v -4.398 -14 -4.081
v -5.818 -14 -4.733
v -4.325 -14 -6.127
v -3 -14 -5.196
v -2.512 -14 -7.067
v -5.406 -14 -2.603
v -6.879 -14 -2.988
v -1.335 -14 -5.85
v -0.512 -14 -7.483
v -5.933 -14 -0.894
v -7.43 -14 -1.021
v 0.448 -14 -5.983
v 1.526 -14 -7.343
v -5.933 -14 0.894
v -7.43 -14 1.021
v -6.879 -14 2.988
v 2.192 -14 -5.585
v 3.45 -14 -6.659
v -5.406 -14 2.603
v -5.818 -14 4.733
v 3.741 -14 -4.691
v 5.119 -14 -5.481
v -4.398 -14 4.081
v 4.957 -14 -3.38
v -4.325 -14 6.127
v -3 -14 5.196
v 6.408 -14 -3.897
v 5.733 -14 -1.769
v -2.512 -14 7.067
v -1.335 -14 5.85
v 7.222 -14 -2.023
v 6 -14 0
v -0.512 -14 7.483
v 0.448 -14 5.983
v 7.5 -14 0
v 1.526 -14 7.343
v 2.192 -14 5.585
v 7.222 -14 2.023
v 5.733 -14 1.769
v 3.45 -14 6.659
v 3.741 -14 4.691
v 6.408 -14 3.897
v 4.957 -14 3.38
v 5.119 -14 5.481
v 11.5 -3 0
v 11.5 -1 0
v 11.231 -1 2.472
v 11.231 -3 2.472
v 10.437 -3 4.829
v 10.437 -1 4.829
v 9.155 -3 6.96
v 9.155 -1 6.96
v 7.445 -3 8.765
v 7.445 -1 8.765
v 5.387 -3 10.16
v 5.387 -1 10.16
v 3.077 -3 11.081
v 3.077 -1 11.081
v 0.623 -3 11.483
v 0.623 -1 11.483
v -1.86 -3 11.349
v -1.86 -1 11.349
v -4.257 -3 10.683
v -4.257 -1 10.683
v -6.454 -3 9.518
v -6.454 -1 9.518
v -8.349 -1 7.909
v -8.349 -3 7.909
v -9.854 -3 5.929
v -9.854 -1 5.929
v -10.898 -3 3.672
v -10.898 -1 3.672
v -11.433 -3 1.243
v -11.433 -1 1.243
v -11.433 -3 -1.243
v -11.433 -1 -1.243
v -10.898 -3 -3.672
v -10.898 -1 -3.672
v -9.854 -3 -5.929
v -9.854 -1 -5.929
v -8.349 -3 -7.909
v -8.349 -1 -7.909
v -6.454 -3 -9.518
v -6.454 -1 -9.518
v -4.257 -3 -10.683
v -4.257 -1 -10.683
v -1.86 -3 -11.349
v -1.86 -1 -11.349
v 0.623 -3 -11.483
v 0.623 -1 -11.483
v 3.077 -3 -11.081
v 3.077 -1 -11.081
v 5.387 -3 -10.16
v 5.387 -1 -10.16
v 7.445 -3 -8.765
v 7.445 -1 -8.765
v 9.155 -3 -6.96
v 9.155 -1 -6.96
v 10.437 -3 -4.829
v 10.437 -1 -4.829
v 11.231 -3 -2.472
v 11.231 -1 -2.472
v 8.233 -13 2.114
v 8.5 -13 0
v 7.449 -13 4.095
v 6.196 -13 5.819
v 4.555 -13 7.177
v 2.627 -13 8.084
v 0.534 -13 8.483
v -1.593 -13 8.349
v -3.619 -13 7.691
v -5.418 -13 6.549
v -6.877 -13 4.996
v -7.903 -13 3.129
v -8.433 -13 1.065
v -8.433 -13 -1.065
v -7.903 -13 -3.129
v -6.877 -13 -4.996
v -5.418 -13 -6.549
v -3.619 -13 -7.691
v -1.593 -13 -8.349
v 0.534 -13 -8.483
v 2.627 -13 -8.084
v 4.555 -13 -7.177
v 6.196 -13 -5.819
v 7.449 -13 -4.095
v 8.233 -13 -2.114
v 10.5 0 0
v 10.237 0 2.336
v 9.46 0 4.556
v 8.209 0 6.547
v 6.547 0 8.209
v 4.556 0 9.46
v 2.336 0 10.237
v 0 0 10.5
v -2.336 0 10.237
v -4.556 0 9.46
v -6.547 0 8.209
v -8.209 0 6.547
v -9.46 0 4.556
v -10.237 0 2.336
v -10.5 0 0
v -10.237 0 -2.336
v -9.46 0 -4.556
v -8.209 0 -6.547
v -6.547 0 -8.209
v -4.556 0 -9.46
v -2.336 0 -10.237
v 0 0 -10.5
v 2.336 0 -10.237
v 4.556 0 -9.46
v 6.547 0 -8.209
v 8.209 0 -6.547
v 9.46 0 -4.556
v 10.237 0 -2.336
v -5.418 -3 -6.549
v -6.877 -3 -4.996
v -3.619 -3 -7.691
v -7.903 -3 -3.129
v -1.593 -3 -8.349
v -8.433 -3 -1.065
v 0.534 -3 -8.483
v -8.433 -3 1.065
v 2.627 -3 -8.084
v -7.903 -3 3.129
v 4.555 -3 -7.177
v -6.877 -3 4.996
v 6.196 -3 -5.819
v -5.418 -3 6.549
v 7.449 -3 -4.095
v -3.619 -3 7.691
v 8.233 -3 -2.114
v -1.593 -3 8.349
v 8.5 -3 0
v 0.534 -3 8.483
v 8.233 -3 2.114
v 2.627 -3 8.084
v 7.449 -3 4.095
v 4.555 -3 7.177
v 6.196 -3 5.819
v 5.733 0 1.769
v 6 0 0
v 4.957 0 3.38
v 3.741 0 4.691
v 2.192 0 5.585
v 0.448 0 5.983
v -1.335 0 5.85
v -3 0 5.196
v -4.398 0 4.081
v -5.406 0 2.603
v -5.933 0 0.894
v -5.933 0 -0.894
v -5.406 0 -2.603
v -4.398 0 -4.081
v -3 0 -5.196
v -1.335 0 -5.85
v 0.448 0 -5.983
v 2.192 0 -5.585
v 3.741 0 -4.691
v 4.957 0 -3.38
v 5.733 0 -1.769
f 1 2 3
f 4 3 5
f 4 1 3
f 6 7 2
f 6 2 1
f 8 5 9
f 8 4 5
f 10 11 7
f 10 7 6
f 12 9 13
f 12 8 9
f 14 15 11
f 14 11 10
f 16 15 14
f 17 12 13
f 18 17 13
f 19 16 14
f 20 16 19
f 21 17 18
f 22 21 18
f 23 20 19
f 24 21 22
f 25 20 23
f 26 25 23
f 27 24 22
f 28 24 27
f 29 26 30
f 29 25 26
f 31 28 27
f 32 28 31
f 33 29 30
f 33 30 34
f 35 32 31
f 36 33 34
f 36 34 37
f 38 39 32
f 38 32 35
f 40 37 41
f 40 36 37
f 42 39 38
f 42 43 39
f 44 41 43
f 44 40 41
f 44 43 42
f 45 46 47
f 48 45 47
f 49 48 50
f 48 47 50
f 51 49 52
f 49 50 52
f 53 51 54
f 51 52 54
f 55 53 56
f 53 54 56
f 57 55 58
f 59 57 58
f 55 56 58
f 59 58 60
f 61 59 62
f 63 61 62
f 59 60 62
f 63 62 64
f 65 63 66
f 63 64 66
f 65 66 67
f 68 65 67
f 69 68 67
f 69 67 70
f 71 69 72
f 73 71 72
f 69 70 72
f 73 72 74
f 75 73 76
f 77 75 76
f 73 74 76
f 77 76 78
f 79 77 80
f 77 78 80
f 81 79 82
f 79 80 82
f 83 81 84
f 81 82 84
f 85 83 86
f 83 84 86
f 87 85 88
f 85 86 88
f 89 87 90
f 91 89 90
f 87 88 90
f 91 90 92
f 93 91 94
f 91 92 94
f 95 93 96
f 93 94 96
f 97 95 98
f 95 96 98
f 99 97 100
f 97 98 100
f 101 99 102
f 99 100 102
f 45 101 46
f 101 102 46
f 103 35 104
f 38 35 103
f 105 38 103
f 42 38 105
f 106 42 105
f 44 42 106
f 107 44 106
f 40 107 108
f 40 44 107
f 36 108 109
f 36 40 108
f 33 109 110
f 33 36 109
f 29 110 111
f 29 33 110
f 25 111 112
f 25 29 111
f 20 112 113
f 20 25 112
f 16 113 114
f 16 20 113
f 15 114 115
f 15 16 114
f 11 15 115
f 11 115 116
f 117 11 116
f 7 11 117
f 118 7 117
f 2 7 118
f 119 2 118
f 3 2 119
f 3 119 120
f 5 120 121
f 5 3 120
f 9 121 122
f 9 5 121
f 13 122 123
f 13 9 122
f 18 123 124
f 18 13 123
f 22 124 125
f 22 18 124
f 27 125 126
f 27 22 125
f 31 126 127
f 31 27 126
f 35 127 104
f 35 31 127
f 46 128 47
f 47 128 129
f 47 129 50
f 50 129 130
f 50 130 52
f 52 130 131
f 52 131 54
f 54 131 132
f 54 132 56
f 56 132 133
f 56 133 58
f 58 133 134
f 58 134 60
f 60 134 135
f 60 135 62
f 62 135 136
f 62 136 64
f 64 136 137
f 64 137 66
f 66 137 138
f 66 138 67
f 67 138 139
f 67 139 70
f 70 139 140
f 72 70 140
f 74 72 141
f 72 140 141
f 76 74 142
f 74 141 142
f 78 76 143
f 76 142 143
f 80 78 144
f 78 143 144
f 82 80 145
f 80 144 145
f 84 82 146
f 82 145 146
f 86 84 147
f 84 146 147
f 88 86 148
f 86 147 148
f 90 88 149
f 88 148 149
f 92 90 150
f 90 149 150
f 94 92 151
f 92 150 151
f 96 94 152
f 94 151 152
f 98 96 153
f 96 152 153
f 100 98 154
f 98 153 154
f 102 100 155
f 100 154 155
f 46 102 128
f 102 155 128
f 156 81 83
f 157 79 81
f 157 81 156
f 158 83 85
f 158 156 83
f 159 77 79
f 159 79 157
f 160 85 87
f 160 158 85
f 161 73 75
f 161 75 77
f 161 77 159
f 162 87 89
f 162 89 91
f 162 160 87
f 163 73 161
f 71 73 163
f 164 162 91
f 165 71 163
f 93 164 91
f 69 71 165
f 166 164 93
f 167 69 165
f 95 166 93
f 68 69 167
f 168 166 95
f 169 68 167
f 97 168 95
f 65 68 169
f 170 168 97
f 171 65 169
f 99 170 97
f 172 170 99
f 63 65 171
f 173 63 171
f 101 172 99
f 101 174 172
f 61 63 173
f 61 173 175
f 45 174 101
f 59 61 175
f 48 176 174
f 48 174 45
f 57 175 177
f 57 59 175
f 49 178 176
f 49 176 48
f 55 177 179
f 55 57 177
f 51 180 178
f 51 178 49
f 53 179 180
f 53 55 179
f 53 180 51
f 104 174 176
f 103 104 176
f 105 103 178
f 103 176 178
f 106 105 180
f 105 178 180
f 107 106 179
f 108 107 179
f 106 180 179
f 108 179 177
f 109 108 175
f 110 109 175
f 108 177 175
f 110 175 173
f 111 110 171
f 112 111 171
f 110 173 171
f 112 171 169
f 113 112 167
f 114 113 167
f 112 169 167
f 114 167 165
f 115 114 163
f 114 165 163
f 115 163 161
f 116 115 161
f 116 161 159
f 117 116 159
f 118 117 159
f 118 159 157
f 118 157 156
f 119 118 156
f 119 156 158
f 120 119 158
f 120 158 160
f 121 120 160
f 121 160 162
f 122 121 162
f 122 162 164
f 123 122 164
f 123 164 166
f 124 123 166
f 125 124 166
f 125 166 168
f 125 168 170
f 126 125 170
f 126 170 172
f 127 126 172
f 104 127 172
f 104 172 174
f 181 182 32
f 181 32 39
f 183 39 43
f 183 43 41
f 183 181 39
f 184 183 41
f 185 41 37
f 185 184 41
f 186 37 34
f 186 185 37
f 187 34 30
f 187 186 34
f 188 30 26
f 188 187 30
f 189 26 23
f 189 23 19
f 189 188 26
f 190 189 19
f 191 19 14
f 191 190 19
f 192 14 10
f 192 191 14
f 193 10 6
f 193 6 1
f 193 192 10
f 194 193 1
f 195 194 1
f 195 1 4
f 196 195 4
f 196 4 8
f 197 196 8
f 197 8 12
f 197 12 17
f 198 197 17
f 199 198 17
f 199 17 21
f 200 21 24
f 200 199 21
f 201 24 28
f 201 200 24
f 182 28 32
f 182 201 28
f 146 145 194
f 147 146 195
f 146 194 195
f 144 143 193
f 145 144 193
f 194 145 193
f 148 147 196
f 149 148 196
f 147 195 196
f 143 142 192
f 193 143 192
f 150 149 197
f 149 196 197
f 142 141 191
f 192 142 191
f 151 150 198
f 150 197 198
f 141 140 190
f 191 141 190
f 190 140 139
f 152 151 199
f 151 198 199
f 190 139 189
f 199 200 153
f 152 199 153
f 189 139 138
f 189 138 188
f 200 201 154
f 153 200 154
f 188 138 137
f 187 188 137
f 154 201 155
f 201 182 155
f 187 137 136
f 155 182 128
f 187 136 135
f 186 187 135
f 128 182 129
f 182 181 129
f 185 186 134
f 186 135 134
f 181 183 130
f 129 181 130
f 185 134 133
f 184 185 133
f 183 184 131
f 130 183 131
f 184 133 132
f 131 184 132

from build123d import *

# Parameters (mm, degrees)
F0_R     = 11.5
F0_R_2   = 8.5
F1_DEPTH = 3
F0_R_3   = 6
F2_DEPTH = 14
F3_SIZE  = 1


with BuildPart() as f1:
    # F0 (on Front) → F1 (new body)
    with BuildSketch(Plane.XZ):
        Circle(F0_R)
        Circle(F0_R_2, mode=Mode.SUBTRACT)
    extrude(amount=F1_DEPTH)

    # F0 (on Front) → F2 (join)
    with BuildSketch(Plane.XZ):
        Circle(F0_R_2)
        Circle(F0_R_3, mode=Mode.SUBTRACT)
    extrude(amount=F2_DEPTH)

    # F3
    f3_edges = [f1.edges().sort_by_distance(p)[0] for p in [
        (-8.5, -14, 0),
        (-11.5, 0, 0),
    ]]
    chamfer(f3_edges, length=F3_SIZE)


solid = f1.part
